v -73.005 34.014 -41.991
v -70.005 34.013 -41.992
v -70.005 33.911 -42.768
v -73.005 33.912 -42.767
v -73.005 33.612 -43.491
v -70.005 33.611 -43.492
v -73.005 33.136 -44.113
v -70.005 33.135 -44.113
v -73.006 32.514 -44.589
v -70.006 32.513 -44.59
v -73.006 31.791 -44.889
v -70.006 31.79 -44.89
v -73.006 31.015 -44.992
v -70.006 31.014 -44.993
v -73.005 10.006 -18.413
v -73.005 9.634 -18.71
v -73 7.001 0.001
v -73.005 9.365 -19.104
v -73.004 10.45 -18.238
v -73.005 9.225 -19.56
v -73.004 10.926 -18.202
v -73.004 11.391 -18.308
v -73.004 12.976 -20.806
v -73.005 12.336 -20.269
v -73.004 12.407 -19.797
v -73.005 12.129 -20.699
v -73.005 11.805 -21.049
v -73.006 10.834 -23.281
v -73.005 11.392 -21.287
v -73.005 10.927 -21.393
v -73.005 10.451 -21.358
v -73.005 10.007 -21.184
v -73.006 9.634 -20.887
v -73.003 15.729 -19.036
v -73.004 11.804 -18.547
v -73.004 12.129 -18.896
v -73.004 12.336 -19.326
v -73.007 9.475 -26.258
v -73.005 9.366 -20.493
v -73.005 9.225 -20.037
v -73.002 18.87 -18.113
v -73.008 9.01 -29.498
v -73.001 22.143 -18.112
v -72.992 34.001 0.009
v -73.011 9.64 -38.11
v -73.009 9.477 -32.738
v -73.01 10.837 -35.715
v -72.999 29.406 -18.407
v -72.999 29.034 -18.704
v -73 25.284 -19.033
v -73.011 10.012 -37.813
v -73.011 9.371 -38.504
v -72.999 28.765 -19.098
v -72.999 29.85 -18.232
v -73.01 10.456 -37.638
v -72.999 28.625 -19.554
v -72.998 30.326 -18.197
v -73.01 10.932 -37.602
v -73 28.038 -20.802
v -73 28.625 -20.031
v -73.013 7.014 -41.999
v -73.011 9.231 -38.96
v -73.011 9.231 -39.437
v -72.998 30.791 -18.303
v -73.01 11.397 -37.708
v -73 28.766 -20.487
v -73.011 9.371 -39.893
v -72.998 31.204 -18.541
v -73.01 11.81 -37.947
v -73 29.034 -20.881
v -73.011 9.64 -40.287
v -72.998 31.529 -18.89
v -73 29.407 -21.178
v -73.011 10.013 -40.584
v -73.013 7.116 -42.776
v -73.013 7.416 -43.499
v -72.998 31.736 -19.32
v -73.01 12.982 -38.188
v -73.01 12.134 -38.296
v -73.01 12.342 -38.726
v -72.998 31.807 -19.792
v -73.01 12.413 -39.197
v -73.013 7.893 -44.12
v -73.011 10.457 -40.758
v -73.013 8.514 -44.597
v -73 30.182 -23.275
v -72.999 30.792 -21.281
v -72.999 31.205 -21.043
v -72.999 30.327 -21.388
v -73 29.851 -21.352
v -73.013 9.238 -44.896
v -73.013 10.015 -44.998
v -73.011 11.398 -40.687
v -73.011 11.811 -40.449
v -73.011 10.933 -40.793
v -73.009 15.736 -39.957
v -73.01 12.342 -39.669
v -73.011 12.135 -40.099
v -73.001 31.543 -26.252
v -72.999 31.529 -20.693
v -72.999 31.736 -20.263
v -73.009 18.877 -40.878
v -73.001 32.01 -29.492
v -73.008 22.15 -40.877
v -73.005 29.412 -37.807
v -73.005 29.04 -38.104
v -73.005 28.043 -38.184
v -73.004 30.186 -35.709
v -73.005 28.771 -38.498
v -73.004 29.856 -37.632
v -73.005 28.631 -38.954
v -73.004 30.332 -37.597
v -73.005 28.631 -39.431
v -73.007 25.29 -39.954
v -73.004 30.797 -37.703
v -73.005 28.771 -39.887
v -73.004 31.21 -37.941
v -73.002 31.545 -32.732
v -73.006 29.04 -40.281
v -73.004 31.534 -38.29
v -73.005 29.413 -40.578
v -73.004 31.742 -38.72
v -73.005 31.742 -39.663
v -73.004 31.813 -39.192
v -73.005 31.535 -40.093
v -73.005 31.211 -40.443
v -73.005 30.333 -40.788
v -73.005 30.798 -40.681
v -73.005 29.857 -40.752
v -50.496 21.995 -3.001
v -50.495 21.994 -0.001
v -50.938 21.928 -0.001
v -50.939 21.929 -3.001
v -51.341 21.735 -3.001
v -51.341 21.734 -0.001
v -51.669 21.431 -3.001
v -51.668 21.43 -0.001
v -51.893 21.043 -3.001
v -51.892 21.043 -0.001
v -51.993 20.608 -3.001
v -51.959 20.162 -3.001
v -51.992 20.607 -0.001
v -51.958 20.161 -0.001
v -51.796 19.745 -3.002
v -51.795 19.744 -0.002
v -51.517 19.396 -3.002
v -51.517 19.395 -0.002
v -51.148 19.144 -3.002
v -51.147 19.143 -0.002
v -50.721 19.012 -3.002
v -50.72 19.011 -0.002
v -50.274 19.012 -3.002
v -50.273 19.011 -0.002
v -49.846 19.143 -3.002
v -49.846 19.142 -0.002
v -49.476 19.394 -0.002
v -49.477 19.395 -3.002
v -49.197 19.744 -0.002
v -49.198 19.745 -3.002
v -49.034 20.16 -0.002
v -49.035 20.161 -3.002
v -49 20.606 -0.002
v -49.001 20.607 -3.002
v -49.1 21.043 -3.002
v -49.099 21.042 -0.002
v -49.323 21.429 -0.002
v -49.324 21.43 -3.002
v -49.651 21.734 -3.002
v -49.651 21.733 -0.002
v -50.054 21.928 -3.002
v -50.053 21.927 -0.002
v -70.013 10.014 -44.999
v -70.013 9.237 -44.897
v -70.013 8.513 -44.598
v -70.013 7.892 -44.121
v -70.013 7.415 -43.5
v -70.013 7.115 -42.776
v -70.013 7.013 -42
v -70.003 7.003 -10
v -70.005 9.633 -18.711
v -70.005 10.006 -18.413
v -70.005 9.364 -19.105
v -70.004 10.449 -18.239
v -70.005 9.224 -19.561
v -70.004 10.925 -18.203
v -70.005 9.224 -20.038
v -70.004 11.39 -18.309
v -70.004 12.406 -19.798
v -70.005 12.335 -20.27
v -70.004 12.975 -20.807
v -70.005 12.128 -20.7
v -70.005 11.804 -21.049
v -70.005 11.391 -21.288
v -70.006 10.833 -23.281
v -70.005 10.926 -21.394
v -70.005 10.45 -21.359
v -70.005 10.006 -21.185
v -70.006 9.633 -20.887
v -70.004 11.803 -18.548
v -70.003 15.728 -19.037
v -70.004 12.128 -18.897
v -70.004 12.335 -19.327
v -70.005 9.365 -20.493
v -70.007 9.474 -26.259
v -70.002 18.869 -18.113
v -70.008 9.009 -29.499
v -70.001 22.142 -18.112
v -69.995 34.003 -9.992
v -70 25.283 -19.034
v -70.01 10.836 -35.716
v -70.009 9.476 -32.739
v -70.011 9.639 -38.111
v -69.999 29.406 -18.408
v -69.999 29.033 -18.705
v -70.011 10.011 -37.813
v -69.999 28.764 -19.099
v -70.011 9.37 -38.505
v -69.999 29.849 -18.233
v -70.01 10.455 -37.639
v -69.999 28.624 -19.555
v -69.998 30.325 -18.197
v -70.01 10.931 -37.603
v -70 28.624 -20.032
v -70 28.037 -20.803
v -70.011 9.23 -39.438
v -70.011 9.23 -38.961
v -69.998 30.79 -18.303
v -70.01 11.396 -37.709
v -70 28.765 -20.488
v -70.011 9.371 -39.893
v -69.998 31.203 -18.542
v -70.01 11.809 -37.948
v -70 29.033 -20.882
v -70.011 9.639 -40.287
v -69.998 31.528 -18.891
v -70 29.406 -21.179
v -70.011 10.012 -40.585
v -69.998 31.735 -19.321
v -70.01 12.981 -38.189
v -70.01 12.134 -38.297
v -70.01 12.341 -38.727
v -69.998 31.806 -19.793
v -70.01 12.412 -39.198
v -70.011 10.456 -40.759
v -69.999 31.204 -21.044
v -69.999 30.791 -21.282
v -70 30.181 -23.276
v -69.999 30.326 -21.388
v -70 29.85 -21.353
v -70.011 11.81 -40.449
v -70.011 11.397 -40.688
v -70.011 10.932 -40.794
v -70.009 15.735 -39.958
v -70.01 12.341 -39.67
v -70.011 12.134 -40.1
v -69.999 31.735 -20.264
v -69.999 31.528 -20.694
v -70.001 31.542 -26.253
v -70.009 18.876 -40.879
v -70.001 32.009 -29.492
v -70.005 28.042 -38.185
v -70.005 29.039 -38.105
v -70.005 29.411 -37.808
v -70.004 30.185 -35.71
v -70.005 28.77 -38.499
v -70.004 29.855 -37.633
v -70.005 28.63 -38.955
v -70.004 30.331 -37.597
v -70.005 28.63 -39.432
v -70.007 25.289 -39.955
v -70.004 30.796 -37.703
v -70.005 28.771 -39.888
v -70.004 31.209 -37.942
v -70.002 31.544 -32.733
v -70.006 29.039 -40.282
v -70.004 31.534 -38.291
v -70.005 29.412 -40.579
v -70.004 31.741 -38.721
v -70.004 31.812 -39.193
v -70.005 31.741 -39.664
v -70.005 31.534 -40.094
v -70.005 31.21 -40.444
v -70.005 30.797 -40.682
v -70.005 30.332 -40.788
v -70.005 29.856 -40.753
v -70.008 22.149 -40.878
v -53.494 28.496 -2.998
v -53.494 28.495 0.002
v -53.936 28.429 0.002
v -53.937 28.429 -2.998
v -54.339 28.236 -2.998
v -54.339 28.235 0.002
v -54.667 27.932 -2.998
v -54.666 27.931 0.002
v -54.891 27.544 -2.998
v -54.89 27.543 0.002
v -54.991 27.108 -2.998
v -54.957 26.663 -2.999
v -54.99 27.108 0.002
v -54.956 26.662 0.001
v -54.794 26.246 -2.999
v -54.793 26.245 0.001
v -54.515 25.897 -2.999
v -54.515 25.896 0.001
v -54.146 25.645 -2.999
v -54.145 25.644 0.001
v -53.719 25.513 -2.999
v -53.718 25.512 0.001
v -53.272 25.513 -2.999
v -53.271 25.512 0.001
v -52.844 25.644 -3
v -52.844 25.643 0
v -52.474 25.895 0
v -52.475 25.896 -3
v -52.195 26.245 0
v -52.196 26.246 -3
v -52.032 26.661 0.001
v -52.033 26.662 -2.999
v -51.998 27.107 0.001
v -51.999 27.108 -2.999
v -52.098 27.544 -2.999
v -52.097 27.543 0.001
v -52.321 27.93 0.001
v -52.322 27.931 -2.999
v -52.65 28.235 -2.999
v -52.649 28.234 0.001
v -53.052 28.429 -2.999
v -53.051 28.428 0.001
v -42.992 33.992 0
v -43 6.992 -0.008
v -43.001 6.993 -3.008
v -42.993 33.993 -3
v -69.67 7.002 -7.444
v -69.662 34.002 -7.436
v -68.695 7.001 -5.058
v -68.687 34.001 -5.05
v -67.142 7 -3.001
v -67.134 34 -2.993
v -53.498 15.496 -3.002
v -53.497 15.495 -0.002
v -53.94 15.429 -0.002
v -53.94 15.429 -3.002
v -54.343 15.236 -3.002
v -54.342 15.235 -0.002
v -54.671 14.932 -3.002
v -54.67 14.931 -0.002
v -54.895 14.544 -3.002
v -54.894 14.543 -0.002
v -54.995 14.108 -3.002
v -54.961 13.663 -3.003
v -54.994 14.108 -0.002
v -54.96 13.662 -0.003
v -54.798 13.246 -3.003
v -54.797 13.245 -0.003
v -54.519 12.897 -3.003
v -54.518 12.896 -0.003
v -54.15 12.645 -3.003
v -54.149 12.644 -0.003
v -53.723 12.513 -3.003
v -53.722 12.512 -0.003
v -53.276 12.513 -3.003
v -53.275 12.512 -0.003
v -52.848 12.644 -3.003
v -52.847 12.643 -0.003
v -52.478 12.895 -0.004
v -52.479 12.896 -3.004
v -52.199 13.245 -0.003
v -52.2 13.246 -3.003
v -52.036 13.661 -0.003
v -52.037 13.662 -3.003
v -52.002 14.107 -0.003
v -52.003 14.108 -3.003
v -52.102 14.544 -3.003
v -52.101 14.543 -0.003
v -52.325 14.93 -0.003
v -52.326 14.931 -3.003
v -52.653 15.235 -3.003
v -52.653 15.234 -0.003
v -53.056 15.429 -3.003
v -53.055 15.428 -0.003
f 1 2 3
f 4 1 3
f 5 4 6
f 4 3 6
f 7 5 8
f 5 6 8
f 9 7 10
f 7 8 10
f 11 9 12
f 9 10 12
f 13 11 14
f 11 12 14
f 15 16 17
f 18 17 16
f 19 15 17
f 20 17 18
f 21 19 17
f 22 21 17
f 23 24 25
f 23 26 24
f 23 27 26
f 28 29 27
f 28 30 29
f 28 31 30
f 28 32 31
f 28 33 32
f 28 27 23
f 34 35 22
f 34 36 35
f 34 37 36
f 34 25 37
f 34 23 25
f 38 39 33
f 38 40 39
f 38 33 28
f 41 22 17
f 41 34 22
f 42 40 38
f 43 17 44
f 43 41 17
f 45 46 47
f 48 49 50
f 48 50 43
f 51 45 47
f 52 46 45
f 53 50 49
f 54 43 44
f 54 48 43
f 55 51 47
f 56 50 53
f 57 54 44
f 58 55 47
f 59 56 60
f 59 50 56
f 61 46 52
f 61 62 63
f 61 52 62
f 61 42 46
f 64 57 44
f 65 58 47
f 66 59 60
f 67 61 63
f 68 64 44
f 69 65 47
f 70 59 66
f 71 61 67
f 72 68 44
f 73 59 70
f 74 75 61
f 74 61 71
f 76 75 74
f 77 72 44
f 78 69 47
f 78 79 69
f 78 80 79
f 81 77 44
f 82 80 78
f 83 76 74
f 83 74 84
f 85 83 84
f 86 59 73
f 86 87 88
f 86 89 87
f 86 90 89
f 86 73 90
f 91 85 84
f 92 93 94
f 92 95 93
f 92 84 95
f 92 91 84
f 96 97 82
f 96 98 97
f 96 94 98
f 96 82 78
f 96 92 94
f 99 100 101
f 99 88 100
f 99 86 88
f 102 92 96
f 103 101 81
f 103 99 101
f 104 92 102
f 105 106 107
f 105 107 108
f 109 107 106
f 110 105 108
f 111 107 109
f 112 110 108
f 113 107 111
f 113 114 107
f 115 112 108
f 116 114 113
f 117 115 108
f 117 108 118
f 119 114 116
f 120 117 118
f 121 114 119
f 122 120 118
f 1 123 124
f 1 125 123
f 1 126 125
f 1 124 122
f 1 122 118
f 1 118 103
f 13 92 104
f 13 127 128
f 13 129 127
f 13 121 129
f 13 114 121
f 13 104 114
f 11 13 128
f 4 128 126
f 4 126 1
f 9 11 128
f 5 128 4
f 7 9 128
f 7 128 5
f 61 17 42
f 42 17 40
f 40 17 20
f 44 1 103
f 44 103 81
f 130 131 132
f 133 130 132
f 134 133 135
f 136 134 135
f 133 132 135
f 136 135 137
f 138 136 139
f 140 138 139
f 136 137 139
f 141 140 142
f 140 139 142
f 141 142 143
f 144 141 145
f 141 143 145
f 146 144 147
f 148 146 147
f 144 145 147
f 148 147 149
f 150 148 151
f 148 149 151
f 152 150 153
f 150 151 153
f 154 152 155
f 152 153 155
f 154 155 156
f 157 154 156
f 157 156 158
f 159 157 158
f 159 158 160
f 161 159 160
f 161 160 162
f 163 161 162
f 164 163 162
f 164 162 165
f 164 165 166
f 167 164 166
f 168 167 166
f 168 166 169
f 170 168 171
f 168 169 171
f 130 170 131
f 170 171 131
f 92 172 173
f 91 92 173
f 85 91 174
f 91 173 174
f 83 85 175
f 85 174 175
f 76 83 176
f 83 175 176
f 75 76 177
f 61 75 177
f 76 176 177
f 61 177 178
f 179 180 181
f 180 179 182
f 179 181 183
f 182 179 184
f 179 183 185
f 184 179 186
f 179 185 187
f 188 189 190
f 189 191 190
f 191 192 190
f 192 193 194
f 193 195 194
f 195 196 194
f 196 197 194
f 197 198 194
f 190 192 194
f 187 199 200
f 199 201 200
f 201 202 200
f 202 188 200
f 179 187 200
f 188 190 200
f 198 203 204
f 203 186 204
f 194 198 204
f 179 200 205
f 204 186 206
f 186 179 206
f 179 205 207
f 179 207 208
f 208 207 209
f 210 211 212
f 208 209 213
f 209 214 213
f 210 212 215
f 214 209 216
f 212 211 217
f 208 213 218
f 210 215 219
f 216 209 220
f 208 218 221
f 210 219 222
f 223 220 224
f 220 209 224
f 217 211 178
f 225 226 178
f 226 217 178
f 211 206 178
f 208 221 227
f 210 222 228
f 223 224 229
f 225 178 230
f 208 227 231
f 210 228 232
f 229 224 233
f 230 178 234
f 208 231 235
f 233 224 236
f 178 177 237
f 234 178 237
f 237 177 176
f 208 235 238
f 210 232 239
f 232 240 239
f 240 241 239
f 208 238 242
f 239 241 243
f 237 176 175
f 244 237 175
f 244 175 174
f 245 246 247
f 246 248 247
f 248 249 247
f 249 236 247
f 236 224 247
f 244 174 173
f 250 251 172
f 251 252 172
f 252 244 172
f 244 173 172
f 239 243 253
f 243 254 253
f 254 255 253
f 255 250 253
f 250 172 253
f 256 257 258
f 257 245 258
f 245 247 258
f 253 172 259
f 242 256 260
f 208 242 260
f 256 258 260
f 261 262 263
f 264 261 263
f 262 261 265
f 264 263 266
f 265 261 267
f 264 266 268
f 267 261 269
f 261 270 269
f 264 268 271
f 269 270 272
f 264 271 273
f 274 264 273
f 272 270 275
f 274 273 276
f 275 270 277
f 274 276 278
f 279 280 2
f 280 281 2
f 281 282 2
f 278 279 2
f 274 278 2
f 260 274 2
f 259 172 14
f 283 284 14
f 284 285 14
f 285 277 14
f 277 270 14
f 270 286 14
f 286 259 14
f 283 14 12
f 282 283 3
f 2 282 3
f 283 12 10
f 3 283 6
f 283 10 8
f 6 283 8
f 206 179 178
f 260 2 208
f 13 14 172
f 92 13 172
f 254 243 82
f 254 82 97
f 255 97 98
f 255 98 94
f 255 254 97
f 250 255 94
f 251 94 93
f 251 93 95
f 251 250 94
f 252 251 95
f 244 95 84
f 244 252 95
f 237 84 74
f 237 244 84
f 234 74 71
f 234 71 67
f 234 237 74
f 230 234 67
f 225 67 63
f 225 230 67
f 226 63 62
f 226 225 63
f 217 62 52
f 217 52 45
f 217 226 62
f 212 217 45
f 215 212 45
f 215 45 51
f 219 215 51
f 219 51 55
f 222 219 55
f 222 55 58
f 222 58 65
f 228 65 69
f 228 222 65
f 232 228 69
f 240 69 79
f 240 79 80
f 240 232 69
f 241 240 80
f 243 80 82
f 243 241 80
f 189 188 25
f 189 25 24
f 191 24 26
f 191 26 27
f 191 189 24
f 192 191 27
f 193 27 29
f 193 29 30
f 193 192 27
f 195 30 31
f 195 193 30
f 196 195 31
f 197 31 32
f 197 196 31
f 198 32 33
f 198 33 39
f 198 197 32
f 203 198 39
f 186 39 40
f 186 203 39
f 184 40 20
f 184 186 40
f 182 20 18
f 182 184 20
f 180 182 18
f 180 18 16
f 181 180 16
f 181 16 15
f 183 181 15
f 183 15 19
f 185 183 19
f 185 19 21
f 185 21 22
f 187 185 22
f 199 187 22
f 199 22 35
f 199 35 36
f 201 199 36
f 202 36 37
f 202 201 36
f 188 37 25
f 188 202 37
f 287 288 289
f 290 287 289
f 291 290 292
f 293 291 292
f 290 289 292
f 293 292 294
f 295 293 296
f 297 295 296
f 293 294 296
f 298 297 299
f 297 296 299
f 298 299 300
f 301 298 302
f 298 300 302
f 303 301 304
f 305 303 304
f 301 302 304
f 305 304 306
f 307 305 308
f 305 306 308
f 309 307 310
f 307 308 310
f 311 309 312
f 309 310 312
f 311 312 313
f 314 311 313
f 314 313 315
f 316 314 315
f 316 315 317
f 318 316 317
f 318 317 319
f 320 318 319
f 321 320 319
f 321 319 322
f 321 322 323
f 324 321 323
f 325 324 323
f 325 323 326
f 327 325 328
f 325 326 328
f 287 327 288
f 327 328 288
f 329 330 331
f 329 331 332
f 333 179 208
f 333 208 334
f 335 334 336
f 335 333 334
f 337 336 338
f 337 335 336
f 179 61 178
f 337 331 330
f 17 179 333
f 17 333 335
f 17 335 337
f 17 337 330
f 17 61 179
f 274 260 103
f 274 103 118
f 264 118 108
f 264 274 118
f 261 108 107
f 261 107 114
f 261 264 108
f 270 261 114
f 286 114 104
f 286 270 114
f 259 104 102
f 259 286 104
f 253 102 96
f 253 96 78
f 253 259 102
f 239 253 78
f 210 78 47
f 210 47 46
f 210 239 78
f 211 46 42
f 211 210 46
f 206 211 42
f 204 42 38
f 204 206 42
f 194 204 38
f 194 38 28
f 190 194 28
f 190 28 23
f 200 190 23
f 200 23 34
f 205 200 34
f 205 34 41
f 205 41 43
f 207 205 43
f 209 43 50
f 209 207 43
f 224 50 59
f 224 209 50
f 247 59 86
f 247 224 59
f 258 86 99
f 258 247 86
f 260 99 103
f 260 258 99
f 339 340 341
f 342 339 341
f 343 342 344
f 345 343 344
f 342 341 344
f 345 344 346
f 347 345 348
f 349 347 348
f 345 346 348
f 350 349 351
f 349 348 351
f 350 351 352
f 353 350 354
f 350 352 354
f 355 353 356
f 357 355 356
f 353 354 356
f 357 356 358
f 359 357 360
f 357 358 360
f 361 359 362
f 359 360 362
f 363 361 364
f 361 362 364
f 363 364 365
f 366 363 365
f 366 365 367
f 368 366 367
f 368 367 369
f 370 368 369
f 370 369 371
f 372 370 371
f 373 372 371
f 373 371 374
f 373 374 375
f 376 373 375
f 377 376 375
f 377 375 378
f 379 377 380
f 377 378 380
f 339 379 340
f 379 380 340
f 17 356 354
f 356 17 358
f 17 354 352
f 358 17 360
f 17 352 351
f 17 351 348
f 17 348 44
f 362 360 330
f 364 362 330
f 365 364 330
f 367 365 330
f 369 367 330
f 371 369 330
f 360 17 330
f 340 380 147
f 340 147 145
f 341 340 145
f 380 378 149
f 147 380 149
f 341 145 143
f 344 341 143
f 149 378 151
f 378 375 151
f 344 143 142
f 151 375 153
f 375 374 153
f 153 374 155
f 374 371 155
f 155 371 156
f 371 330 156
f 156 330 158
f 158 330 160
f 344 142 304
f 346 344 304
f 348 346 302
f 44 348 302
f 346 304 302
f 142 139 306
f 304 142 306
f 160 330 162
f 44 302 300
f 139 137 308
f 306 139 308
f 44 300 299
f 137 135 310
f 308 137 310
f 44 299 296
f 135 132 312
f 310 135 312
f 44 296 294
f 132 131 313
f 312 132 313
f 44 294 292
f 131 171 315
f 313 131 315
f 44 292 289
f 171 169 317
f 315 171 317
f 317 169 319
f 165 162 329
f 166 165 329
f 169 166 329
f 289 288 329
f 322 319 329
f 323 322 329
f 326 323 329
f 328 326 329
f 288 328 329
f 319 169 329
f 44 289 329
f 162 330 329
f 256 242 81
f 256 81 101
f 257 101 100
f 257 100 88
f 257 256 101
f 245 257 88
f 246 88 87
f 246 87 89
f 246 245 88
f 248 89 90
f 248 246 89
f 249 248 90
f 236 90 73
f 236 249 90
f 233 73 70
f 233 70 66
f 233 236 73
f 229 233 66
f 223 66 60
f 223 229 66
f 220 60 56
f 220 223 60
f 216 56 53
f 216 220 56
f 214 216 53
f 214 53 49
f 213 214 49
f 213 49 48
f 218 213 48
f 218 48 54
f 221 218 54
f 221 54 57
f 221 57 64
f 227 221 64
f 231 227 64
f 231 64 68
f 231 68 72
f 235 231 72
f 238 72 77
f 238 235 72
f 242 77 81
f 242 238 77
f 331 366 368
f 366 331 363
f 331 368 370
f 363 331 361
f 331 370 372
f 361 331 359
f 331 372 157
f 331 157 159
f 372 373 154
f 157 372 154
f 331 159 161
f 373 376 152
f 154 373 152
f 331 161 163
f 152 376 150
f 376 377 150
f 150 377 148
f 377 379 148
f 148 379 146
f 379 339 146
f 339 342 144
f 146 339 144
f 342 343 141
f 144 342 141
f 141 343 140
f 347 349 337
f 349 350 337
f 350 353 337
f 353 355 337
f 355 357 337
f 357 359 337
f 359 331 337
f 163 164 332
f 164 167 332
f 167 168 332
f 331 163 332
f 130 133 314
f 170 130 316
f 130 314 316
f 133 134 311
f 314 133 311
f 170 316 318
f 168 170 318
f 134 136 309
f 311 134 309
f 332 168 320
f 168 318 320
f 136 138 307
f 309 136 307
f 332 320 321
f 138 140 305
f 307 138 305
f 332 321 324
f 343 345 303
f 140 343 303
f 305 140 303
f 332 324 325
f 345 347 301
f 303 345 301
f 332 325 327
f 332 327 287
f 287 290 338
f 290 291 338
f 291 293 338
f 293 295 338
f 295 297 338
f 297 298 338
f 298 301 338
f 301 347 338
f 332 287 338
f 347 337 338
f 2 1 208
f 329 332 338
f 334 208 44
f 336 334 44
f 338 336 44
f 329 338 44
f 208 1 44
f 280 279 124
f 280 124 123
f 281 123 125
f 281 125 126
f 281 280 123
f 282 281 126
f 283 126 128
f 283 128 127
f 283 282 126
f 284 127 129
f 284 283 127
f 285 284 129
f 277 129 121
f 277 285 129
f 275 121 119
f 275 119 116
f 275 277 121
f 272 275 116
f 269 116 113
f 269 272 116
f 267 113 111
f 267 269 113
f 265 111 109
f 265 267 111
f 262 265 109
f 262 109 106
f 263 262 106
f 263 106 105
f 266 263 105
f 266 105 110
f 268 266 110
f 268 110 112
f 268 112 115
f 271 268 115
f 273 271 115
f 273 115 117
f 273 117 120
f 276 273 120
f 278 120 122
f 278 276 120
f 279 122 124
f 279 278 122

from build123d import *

# Parameters (mm, degrees)
SKETCH103_W             = 27
SKETCH103_H             = 27
SKETCH103_R             = 1.5
PAD047_DEPTH            = 3
SKETCH102_R             = 11.5
SKETCH102_R_2           = 1.6
PAD048_DEPTH            = 3
PAD049_DEPTH            = 27
BODY011_ROLL_ANGLE      = -89.982677
BODY011_PITCH_ANGLE     = -0.017318
BODY011_PLACEMENT_ANGLE = 89.982677


with BuildPart() as part:
    # Sketch103 → Pad047 (new body)
    with BuildSketch(Plane.XZ):
        with Locations((13.5, -13.5)):
            Rectangle(SKETCH103_W, SKETCH103_H)
        with Locations((7, -16.5)):
            Circle(SKETCH103_R, mode=Mode.SUBTRACT)
        with Locations((13.5, -19.5)):
            Circle(SKETCH103_R, mode=Mode.SUBTRACT)
        with Locations((20, -16.5)):
            Circle(SKETCH103_R, mode=Mode.SUBTRACT)
    extrude(amount=-PAD047_DEPTH)

    # Sketch102 → Pad048 (join)
    with BuildSketch(Plane.XY):
        with BuildLine():
            Line((0, 42), (0, 0))
            Line((0, 0), (27, 0))
            Line((27, 0), (27, 42))
            ThreePointArc((27, 42), (26.12132, 44.12132), (24, 45))
            Line((24, 45), (3, 45))
            ThreePointArc((3, 45), (0.87868, 44.12132), (0, 42))
        make_face()
        with Locations((13.5, 29.5)):
            Circle(SKETCH102_R, mode=Mode.SUBTRACT)
        with Locations((3.8, 39.2)):
            Circle(SKETCH102_R_2, mode=Mode.SUBTRACT)
        with Locations((23.2, 39.2)):
            Circle(SKETCH102_R_2, mode=Mode.SUBTRACT)
        with Locations((23.2, 19.8)):
            Circle(SKETCH102_R_2, mode=Mode.SUBTRACT)
        with Locations((3.8, 19.8)):
            Circle(SKETCH102_R_2, mode=Mode.SUBTRACT)
    extrude(amount=PAD048_DEPTH)

    # Sketch104 → Pad049 (join)
    with BuildSketch(Plane.YZ):
        with BuildLine():
            ThreePointArc((10, 0), (2.928931, -2.928933), (0, -10.000003))
            Line((0, -10.000003), (0, 0))
            Line((10, 0), (0, 0))
        make_face()
    extrude(amount=PAD049_DEPTH)


with BuildPart() as part_1:
    # Body011 roll: moved
    add(part.part.rotate(Axis((0, 0, 0), (1, 0, 0)), BODY011_ROLL_ANGLE))


with BuildPart() as part_2:
    # Body011 pitch: moved
    add(part_1.part.rotate(Axis((0, 0, 0), (0, 1, 0)), BODY011_PITCH_ANGLE))


with BuildPart() as part_3:
    # Body011 placement: moved
    add(part_2.part.moved(Location((-70, 7, 0))).rotate(Axis((-70, 7, 0), (0, 0, 1)), BODY011_PLACEMENT_ANGLE))


solid = part_3.part
